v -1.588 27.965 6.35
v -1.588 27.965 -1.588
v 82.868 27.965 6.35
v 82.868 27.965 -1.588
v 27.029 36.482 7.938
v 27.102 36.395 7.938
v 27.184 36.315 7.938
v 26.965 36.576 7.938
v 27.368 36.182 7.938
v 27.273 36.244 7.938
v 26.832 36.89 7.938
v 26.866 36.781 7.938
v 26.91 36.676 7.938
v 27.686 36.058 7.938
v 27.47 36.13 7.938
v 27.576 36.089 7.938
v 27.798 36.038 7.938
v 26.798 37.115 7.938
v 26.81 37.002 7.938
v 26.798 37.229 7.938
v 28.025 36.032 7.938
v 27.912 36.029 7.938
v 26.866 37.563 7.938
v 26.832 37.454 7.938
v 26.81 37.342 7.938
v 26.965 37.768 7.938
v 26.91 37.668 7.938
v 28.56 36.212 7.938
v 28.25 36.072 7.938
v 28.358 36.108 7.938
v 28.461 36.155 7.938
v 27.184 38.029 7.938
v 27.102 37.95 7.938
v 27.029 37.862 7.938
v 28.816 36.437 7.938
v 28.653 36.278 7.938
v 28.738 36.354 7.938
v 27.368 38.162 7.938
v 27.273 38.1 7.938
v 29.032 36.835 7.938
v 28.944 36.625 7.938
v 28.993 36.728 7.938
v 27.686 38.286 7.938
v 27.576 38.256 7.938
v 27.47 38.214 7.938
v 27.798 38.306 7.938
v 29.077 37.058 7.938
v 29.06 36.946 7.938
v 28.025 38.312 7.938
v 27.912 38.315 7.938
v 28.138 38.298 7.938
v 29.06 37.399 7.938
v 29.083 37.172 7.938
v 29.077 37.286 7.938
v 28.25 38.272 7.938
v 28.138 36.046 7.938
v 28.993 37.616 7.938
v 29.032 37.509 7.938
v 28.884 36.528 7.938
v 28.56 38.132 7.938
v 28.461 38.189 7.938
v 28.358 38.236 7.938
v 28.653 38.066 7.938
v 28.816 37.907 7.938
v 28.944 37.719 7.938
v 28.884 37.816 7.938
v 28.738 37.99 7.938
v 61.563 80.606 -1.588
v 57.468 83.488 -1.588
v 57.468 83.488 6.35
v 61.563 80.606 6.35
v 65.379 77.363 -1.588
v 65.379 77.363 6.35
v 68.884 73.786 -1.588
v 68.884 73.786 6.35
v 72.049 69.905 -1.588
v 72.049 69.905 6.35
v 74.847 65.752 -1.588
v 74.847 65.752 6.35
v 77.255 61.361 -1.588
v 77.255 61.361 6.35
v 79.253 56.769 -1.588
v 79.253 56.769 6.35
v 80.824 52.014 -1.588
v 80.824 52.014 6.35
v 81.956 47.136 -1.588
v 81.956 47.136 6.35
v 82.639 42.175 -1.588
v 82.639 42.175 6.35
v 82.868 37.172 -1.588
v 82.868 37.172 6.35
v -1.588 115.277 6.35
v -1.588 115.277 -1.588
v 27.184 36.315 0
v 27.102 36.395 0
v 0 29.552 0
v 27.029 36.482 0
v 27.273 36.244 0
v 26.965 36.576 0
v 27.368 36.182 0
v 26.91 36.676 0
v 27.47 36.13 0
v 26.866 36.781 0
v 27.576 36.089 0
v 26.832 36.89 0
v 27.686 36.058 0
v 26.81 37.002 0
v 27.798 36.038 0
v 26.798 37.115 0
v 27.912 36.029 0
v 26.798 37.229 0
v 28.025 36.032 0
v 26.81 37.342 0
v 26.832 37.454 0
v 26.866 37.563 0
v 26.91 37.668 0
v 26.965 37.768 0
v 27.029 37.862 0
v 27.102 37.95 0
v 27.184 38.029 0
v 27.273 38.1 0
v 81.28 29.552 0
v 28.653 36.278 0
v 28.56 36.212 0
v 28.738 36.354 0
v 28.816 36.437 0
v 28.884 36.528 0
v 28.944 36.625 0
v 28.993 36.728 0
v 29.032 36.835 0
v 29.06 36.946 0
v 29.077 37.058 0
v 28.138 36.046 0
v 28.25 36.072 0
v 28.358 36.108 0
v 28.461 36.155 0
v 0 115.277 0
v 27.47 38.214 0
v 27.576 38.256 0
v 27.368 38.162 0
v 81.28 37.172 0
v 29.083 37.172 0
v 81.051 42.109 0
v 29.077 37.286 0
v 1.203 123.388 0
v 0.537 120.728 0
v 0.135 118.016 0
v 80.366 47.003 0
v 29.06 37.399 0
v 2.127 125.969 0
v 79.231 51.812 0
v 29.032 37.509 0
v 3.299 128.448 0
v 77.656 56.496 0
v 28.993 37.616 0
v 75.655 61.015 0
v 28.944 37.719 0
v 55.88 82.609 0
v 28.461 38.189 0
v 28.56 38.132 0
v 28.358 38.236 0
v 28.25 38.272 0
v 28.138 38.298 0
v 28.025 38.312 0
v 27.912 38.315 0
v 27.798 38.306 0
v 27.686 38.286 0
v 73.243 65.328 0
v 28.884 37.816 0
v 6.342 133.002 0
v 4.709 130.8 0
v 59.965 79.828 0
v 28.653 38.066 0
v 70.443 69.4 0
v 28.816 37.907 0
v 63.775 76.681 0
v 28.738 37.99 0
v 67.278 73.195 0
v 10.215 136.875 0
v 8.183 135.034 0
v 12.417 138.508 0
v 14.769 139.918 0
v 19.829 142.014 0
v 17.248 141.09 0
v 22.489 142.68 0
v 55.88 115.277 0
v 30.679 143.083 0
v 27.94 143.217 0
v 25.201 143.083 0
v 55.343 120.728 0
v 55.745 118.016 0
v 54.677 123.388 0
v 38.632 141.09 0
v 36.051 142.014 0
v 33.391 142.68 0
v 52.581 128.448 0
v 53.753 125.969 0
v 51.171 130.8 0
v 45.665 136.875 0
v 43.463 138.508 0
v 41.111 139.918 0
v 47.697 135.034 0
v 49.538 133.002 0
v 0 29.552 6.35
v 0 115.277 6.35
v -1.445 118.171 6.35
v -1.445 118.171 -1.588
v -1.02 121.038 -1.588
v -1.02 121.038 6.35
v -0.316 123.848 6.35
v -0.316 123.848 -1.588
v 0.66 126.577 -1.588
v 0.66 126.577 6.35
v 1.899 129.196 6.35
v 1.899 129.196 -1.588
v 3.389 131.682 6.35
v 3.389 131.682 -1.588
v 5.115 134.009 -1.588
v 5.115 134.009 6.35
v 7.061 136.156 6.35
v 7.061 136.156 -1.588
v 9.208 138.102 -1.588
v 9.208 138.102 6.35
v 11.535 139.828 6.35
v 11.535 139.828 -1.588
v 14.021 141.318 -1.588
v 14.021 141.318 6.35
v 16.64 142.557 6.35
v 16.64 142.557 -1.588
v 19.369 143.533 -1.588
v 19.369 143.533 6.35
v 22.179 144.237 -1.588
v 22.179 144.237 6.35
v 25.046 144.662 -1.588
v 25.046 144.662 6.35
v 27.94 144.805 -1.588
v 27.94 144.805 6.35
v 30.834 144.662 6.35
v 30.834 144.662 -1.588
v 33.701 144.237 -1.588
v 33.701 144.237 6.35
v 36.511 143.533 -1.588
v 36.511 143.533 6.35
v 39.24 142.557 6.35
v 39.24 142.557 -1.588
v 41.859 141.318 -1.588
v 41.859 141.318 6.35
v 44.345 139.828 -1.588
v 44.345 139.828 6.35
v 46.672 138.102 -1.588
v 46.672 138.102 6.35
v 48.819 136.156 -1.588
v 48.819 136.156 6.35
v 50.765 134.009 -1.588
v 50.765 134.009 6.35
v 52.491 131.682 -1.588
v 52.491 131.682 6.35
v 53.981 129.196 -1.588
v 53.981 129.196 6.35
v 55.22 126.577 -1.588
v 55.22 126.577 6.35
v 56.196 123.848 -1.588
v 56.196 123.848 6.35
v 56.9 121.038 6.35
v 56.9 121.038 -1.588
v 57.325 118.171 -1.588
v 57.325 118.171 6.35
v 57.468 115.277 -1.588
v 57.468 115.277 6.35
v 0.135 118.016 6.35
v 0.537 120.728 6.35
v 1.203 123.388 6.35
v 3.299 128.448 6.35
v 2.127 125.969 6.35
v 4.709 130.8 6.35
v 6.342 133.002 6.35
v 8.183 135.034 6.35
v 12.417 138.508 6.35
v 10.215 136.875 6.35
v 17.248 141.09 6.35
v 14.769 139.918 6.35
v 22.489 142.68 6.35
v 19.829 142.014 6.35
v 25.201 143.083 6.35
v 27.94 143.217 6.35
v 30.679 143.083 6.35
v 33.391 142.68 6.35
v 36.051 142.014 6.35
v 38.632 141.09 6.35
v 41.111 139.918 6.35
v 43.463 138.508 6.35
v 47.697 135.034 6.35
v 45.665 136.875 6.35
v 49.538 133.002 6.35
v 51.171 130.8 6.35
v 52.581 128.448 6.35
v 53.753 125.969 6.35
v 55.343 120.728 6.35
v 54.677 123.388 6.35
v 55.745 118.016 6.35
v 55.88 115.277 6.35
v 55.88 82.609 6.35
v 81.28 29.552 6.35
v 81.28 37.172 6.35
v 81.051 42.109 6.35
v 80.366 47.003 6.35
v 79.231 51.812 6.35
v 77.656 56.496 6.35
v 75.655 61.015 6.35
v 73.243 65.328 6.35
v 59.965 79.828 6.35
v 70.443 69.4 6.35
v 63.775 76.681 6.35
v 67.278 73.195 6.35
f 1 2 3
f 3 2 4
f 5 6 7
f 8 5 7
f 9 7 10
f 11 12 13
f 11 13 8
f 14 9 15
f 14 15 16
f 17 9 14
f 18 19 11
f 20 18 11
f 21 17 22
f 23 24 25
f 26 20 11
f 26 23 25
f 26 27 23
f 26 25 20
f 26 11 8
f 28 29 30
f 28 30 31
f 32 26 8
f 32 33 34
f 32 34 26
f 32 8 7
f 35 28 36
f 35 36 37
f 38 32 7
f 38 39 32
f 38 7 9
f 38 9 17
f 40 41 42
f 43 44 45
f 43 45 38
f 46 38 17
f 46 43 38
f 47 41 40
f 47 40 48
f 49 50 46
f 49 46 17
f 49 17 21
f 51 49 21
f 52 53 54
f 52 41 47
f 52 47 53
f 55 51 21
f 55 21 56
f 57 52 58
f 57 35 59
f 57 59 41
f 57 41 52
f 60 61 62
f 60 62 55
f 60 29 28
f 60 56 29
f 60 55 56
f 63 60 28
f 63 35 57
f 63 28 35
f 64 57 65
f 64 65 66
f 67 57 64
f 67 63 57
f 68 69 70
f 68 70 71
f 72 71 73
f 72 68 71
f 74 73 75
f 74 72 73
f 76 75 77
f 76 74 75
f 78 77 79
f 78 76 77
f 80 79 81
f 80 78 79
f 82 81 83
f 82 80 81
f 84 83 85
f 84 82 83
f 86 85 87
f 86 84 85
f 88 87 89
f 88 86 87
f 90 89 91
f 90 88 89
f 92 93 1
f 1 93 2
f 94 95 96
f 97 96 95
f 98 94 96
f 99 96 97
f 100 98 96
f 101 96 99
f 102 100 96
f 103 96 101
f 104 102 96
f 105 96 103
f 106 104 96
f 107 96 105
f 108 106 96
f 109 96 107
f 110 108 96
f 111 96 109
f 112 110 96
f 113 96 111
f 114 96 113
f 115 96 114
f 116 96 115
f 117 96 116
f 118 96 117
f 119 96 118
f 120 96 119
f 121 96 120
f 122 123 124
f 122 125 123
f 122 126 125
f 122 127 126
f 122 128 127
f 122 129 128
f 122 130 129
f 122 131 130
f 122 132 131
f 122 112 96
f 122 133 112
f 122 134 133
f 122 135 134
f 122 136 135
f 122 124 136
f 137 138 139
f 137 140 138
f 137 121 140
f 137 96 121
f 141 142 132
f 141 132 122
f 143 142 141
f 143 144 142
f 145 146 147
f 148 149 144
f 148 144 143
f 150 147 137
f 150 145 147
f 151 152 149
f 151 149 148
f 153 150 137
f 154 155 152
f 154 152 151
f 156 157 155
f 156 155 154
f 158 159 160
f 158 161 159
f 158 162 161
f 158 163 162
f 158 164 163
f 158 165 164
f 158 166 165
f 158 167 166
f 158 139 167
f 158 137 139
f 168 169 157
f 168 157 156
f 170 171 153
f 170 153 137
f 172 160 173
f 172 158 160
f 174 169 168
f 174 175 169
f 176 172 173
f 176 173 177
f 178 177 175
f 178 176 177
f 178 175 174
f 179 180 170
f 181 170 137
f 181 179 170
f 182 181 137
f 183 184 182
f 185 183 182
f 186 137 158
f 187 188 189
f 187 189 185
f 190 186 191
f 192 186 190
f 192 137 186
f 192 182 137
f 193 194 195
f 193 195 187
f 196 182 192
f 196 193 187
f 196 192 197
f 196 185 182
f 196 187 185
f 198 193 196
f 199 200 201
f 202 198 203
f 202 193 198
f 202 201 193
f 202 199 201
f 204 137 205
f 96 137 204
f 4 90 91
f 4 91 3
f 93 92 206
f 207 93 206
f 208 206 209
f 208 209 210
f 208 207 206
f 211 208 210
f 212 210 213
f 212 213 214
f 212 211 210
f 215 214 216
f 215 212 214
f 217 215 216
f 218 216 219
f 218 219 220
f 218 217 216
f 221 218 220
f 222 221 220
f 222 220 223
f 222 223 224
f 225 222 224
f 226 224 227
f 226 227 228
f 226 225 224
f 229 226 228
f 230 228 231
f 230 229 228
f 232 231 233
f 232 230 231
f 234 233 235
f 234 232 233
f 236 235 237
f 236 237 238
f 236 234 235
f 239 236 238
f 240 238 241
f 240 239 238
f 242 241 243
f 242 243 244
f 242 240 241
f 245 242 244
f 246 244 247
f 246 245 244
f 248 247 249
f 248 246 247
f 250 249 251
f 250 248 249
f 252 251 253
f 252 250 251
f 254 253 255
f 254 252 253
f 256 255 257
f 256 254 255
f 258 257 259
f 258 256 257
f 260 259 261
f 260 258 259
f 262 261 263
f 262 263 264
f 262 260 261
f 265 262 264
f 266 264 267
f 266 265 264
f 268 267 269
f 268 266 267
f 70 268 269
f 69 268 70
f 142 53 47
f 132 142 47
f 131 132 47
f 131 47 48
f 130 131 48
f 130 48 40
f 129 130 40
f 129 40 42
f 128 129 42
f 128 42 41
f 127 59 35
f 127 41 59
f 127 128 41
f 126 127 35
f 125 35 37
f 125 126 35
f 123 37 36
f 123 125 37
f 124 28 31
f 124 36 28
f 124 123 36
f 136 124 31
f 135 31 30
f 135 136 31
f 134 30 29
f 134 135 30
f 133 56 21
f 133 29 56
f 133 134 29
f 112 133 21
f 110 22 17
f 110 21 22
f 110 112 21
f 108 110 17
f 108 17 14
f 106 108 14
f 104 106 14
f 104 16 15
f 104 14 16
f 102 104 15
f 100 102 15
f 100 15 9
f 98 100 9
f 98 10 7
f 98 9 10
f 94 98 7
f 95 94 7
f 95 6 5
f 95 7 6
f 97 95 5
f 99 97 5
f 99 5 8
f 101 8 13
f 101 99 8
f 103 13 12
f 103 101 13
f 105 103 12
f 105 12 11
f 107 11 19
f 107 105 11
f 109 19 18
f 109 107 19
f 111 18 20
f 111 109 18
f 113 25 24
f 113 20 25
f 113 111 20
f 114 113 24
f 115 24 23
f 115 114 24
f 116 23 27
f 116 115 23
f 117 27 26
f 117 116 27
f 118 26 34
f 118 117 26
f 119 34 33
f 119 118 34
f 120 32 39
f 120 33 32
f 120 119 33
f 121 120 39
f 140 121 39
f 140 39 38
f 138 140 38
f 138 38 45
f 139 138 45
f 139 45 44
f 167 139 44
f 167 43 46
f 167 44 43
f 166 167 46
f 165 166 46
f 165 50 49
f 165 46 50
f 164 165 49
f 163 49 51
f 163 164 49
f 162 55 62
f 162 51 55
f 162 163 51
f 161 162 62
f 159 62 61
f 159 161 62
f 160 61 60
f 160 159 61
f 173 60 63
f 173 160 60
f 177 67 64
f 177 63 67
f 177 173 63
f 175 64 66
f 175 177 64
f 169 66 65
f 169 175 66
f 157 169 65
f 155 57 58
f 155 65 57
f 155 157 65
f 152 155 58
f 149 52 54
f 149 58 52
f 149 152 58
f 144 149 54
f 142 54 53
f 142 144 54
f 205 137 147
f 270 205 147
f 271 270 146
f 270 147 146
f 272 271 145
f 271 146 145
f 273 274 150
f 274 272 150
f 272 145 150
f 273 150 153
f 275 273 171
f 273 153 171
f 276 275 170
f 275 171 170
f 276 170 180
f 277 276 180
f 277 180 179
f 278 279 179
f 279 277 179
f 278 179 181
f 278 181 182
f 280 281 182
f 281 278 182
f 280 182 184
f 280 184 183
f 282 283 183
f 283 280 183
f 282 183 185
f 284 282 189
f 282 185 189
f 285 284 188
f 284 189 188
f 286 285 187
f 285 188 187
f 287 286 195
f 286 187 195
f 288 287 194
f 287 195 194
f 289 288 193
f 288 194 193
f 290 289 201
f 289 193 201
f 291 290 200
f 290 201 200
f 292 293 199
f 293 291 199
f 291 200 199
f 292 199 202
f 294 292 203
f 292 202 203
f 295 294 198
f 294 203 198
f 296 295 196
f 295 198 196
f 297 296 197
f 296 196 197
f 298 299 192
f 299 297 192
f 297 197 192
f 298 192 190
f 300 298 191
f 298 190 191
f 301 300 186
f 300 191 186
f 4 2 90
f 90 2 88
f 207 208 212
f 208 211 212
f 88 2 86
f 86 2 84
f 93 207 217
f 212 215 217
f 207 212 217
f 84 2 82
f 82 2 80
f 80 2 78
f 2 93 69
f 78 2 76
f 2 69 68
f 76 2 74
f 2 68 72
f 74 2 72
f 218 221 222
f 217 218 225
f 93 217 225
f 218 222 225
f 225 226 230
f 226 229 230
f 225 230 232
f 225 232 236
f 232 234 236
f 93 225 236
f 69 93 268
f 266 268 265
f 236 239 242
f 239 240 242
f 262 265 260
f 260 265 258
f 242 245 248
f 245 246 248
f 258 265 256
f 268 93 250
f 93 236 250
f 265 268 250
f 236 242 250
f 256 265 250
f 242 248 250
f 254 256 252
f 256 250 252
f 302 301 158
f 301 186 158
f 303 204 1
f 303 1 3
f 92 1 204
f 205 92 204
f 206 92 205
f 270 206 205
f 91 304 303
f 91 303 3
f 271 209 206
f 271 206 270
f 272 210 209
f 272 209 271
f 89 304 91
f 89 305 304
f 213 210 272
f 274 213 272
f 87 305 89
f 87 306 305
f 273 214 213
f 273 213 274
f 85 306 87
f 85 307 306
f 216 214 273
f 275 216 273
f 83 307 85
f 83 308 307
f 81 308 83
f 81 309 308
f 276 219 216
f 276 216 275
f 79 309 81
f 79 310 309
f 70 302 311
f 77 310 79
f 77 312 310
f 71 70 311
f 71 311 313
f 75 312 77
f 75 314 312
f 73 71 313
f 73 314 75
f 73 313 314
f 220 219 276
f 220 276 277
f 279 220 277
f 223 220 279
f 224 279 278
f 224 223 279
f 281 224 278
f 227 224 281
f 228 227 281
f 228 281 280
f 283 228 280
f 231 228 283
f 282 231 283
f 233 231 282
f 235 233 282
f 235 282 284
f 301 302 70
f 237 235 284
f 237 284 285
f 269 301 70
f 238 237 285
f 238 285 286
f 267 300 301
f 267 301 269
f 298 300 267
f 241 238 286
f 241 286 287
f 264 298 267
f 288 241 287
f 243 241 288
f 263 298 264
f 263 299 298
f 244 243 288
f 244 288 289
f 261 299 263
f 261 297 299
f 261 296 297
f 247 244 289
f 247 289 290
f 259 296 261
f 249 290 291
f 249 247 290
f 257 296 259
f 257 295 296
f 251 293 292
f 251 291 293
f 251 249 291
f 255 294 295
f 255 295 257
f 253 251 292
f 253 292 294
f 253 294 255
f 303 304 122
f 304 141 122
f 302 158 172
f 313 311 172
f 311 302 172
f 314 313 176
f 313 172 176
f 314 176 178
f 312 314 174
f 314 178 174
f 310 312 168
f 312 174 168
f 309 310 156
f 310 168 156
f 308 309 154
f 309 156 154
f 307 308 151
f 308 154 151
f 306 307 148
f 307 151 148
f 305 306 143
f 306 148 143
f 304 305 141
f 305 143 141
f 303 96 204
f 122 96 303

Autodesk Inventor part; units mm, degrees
ref_plane "YZ Plane" through (0, 0, 0) normal (1, 0, 0) x (0, 1, 0)
ref_plane "XZ Plane" through (0, 0, 0) normal (0, 1, 0) x (-1, 0, 0)
ref_plane "XY Plane" through (0, 0, 0) normal (0, 0, 1) x (1, 0, 0)
sketch "Outline" plane through (0, 0, 0) normal (0, 0, 1) x (1, 0, 0)
  line L0 (0, 37.1721) -> (55.88, 37.1721) construction
  line L1 (55.88, 37.1721) -> (55.88, 115.2771) construction
  line L2 (55.88, 115.2771) -> (0, 115.2771) construction
  line L3 (0, 115.2771) -> (0, 37.1721) construction
  circle A0 centre (27.94, 115.2771) radius 26.67 construction
  circle A1 centre (27.94, 37.1721) radius 52.07 construction
  circle A2 centre (27.94, 115.2771) radius 27.94 construction
  circle A3 centre (27.94, 37.1721) radius 53.34 construction
  arc A4 (55.88, 115.2771) -> (0, 115.2771) centre (27.94, 115.2771) ccw
  line L4 (55.88, 115.2771) -> (55.88, 82.609)
  arc A5 (81.28, 37.1721) -> (55.88, 82.609) centre (27.94, 37.1721) ccw
  line L5 (142.2611, 29.5521) -> (-127.7704, 29.5521) construction
  line L6 (81.28, 37.1721) -> (81.28, 29.5521)
  line L7 (0, 29.5521) -> (81.28, 29.5521)
  line L8 (0, 115.2771) -> (0, 29.5521)
  dimension "d20" = 78.105
  dimension "d23" = 104.14
  dimension "d25" = 53.34
  dimension "d27" = 1.27
  dimension "d28" = 55.88
  dimension "d29" = 55.88
  dimension "d30" = 1.27
  dimension "d31" = 7.62
extrude "Edge Ext" add sketch "Outline" along normal blind 6.35
shell "Edge_Shell" thickness 1.5875 outward yes removed faces 1 at (18.6267, 75.8128, 6.35)
sketch "Pegs" plane through (27.94, 115.2771, 0) normal (0, 0, 1) x (1, 0, 0)
  arc A0 (53.34, -78.105) -> (27.94, -32.6681) centre (0, -78.105) ccw projected
  circle A1 centre (0, -78.105) radius 1.143
  point P0 (-27.94, -115.2771)
  dimension "d36" = 2.286
extrude "Pegs_Ext" add sketch "Pegs" along normal blind 7.9375
sketch "Sketch3" plane through (27.94, 115.2771, 0) normal (0, 0, 1) x (1, 0, 0)
  circle A0 centre (0, -78.105) radius 1.143 projected
  arc A1 (27.94, 0) -> (-27.94, 0) centre (0, 0) ccw projected
  line L0 (-27.94, 0) -> (-27.94, -85.725) projected
  line L1 (-27.94, -85.725) -> (53.34, -85.725) projected
  line L2 (53.34, -85.725) -> (53.34, -78.105) projected
  arc A2 (53.34, -78.105) -> (27.94, -32.6681) centre (0, -78.105) ccw projected
  line L3 (27.94, -32.6681) -> (27.94, 0) projected
  line L4 (46.559, 0) -> (-50.3798, 0) construction
  line L5 (0, 35.3546) -> (0, -92.7907) construction
  circle A3 centre (0, 0) radius 27.94 construction
  line L6 (46.559, 3.175) -> (-50.3798, 3.175) construction
  line L7 (46.559, -3.175) -> (-50.3798, -3.175) construction
  line L8 (-27.94, 3.175) -> (27.94, 3.175)
  line L9 (27.94, 3.175) -> (27.94, -3.175)
  line L10 (27.94, -3.175) -> (-27.94, -3.175)
  line L11 (-27.94, -3.175) -> (-27.94, 3.175)
  line L12 (3.175, 35.3546) -> (3.175, -85.725) construction
  line L13 (-3.175, 35.3546) -> (-3.175, -92.7907) construction
  line L14 (-3.175, 27.94) -> (3.175, 27.94)
  line L15 (3.175, 27.94) -> (3.175, -85.725)
  line L16 (3.175, -85.725) -> (-3.175, -85.725)
  line L17 (-3.175, -85.725) -> (-3.175, 27.94)
  arc A4 (27.94, 0) -> (-27.94, 0) centre (0, 0) ccw projected
  line L18 (0, -78.105) -> (73.8592, -78.105) construction
  line L19 (0, -78.105) -> (-73.8592, -78.105) construction
  line L20 (71.8226, -74.93) -> (-43.3054, -74.93) construction
  line L21 (71.8226, -81.28) -> (-43.3054, -81.28) construction
  line L22 (-27.94, -74.93) -> (53.34, -74.93)
  line L23 (53.34, -74.93) -> (53.34, -81.28)
  line L24 (53.34, -81.28) -> (-27.94, -81.28)
  line L25 (-27.94, -81.28) -> (-27.94, -74.93)
  arc A5 (53.34, -78.105) -> (27.94, -32.6681) centre (0, -78.105) ccw projected
  line L26 (-27.94, -85.725) -> (-27.94, 0) projected
  point P0 (-27.94, -115.2771)
  dimension "d39" = 3.175
  dimension "d40" = 3.175
  dimension "d41" = 55.88
  dimension "d42" = 55.88
  dimension "d43" = 3.175
  dimension "d44" = 3.175
  dimension "d45" = 113.665
  dimension "d46" = 113.665
  dimension "d47" = 3.175
equation "\"d29\" = d28"
equation "\"d41\" = d42"
equation "\"d46\" = d45"
properties part number "housing"
